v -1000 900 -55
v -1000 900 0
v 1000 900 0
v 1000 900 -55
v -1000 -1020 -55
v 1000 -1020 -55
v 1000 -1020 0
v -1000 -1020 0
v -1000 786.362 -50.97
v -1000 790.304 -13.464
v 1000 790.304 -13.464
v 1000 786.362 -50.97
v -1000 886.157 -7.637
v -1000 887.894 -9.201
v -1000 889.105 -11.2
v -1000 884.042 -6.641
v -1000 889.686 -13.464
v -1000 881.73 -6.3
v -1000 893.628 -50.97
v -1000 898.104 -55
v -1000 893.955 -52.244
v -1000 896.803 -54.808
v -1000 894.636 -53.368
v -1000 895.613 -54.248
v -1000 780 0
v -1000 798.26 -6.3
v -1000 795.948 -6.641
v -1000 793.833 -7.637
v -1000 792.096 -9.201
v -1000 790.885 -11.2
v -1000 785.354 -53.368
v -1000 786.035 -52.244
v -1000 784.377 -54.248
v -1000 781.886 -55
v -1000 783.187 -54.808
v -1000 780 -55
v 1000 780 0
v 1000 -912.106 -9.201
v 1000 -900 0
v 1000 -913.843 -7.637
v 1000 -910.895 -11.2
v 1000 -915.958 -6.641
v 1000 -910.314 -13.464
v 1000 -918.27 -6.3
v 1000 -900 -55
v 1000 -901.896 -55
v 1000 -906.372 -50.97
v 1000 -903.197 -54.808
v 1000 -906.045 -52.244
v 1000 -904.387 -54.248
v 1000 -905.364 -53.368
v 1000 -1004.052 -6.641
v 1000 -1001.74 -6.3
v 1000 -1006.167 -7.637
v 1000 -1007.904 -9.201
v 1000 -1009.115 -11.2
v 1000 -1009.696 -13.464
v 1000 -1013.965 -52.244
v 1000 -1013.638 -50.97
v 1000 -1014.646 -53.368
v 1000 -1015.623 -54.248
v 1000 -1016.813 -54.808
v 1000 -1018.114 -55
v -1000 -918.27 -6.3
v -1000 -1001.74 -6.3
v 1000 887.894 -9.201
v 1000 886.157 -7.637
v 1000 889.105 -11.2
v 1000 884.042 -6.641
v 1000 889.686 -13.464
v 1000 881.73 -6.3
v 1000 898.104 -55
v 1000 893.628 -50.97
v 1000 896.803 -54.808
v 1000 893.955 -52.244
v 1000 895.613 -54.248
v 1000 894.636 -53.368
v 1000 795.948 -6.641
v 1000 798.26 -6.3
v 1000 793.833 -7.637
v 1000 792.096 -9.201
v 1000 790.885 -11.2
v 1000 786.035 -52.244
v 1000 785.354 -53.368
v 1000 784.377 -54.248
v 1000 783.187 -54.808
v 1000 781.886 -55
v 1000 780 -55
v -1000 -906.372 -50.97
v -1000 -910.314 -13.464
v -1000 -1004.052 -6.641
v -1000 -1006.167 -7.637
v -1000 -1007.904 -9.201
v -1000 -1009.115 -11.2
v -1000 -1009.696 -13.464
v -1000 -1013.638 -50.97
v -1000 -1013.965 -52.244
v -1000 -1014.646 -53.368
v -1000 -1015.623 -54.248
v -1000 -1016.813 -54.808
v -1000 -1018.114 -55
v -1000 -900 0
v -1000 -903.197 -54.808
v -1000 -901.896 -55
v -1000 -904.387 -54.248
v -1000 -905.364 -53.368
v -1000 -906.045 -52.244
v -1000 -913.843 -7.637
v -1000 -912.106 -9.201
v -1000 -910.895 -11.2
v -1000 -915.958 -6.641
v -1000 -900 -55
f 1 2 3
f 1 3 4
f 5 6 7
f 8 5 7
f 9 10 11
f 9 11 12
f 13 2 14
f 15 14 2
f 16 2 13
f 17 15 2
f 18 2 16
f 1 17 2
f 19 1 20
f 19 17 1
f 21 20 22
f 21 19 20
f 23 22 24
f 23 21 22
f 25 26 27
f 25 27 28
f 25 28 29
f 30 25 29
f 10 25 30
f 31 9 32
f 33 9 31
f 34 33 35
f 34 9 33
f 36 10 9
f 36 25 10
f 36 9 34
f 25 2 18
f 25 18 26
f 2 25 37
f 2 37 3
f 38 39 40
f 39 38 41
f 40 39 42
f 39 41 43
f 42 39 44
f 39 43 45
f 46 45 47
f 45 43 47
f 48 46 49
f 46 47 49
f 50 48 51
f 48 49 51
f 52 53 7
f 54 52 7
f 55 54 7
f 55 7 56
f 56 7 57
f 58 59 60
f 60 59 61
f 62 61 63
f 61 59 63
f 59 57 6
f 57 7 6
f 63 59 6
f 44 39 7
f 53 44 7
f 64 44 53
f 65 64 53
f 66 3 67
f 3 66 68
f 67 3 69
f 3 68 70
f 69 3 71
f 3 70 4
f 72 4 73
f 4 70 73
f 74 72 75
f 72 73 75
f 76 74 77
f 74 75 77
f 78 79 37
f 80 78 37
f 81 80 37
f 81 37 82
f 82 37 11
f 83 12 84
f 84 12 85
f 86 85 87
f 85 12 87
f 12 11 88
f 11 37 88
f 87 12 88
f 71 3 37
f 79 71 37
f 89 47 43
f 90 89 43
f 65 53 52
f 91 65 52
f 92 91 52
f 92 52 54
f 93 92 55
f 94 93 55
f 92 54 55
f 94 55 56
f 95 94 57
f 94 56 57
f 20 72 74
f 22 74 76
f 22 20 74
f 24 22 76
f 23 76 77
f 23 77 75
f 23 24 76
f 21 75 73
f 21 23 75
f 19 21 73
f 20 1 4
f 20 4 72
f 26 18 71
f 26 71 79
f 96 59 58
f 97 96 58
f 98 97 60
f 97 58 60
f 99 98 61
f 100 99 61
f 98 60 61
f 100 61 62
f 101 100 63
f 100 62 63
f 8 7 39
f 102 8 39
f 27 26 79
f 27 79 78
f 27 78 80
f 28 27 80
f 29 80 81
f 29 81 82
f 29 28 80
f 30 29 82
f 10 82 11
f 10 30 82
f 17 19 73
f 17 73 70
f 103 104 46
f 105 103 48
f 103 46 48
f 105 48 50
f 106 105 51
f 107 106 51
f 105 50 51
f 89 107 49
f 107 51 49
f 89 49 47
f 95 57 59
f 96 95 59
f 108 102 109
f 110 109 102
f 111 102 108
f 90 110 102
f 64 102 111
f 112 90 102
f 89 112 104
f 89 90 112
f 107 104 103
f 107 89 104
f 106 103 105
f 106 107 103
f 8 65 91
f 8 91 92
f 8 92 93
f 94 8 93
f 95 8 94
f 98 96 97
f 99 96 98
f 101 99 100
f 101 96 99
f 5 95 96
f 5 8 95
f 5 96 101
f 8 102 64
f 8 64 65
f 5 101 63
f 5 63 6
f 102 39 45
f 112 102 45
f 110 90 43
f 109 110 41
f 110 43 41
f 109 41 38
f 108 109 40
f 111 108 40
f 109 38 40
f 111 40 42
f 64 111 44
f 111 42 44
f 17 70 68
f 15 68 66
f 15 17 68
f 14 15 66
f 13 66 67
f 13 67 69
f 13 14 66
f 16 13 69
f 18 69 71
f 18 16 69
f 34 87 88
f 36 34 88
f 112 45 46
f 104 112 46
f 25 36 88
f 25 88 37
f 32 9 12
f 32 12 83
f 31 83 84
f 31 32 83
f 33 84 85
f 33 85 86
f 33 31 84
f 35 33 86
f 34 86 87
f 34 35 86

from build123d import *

# Parameters (mm, degrees)
MIEMBRO_ESTRUCTURAL1_DEPTH   = 2000
MIEMBRO_ESTRUCTURAL1_2_DEPTH = 2000


with BuildPart() as part:
    # Sketch1 → Miembro estructural1 (new body)
    with BuildSketch(Plane(origin=(-1000, 900, 0), x_dir=(0, 0, -1), z_dir=(-1, 0, 0))):
        with BuildLine():
            Line((55, 120), (0, 120))
            Line((0, 120), (0, 0))
            Line((0, 0), (55, 0))
            Line((55, 0), (55, 1.896373189))
            ThreePointArc((55, 1.896373189), (53.844151715, 4.907460917), (50.970378085, 6.371721718))
            Line((50.970378085, 6.371721718), (13.463772294, 10.313824837))
            ThreePointArc((13.463772294, 10.313824837), (8.354841396, 12.916955149), (6.3, 18.27))
            Line((6.3, 18.27), (6.3, 101.74))
            ThreePointArc((6.3, 101.74), (8.354841396, 107.093044851), (13.463772294, 109.696175163))
            Line((13.463772294, 109.696175163), (50.970378085, 113.638278282))
            ThreePointArc((50.970378085, 113.638278282), (53.844151715, 115.102539083), (55, 118.113626811))
            Line((55, 118.113626811), (55, 120))
        make_face()
    extrude(amount=-MIEMBRO_ESTRUCTURAL1_DEPTH)


with BuildPart() as body_2:
    # Sketch1 on segment 2 (carried to segment 2) → Miembro estructural1 2 (new body)
    with BuildSketch(Plane(origin=(1000, -900, 0), x_dir=(0, 0, -1), z_dir=(-1, 0, 0))):
        with BuildLine():
            Line((55, 120), (0, 120))
            Line((0, 120), (0, 0))
            Line((0, 0), (55, 0))
            Line((55, 0), (55, 1.896373189))
            ThreePointArc((55, 1.896373189), (53.844151715, 4.907460917), (50.970378085, 6.371721718))
            Line((50.970378085, 6.371721718), (13.463772294, 10.313824837))
            ThreePointArc((13.463772294, 10.313824837), (8.354841396, 12.916955149), (6.3, 18.27))
            Line((6.3, 18.27), (6.3, 101.74))
            ThreePointArc((6.3, 101.74), (8.354841396, 107.093044851), (13.463772294, 109.696175163))
            Line((13.463772294, 109.696175163), (50.970378085, 113.638278282))
            ThreePointArc((50.970378085, 113.638278282), (53.844151715, 115.102539083), (55, 118.113626811))
            Line((55, 118.113626811), (55, 120))
        make_face()
    extrude(amount=MIEMBRO_ESTRUCTURAL1_2_DEPTH)


solid = Compound([part.part, body_2.part])
